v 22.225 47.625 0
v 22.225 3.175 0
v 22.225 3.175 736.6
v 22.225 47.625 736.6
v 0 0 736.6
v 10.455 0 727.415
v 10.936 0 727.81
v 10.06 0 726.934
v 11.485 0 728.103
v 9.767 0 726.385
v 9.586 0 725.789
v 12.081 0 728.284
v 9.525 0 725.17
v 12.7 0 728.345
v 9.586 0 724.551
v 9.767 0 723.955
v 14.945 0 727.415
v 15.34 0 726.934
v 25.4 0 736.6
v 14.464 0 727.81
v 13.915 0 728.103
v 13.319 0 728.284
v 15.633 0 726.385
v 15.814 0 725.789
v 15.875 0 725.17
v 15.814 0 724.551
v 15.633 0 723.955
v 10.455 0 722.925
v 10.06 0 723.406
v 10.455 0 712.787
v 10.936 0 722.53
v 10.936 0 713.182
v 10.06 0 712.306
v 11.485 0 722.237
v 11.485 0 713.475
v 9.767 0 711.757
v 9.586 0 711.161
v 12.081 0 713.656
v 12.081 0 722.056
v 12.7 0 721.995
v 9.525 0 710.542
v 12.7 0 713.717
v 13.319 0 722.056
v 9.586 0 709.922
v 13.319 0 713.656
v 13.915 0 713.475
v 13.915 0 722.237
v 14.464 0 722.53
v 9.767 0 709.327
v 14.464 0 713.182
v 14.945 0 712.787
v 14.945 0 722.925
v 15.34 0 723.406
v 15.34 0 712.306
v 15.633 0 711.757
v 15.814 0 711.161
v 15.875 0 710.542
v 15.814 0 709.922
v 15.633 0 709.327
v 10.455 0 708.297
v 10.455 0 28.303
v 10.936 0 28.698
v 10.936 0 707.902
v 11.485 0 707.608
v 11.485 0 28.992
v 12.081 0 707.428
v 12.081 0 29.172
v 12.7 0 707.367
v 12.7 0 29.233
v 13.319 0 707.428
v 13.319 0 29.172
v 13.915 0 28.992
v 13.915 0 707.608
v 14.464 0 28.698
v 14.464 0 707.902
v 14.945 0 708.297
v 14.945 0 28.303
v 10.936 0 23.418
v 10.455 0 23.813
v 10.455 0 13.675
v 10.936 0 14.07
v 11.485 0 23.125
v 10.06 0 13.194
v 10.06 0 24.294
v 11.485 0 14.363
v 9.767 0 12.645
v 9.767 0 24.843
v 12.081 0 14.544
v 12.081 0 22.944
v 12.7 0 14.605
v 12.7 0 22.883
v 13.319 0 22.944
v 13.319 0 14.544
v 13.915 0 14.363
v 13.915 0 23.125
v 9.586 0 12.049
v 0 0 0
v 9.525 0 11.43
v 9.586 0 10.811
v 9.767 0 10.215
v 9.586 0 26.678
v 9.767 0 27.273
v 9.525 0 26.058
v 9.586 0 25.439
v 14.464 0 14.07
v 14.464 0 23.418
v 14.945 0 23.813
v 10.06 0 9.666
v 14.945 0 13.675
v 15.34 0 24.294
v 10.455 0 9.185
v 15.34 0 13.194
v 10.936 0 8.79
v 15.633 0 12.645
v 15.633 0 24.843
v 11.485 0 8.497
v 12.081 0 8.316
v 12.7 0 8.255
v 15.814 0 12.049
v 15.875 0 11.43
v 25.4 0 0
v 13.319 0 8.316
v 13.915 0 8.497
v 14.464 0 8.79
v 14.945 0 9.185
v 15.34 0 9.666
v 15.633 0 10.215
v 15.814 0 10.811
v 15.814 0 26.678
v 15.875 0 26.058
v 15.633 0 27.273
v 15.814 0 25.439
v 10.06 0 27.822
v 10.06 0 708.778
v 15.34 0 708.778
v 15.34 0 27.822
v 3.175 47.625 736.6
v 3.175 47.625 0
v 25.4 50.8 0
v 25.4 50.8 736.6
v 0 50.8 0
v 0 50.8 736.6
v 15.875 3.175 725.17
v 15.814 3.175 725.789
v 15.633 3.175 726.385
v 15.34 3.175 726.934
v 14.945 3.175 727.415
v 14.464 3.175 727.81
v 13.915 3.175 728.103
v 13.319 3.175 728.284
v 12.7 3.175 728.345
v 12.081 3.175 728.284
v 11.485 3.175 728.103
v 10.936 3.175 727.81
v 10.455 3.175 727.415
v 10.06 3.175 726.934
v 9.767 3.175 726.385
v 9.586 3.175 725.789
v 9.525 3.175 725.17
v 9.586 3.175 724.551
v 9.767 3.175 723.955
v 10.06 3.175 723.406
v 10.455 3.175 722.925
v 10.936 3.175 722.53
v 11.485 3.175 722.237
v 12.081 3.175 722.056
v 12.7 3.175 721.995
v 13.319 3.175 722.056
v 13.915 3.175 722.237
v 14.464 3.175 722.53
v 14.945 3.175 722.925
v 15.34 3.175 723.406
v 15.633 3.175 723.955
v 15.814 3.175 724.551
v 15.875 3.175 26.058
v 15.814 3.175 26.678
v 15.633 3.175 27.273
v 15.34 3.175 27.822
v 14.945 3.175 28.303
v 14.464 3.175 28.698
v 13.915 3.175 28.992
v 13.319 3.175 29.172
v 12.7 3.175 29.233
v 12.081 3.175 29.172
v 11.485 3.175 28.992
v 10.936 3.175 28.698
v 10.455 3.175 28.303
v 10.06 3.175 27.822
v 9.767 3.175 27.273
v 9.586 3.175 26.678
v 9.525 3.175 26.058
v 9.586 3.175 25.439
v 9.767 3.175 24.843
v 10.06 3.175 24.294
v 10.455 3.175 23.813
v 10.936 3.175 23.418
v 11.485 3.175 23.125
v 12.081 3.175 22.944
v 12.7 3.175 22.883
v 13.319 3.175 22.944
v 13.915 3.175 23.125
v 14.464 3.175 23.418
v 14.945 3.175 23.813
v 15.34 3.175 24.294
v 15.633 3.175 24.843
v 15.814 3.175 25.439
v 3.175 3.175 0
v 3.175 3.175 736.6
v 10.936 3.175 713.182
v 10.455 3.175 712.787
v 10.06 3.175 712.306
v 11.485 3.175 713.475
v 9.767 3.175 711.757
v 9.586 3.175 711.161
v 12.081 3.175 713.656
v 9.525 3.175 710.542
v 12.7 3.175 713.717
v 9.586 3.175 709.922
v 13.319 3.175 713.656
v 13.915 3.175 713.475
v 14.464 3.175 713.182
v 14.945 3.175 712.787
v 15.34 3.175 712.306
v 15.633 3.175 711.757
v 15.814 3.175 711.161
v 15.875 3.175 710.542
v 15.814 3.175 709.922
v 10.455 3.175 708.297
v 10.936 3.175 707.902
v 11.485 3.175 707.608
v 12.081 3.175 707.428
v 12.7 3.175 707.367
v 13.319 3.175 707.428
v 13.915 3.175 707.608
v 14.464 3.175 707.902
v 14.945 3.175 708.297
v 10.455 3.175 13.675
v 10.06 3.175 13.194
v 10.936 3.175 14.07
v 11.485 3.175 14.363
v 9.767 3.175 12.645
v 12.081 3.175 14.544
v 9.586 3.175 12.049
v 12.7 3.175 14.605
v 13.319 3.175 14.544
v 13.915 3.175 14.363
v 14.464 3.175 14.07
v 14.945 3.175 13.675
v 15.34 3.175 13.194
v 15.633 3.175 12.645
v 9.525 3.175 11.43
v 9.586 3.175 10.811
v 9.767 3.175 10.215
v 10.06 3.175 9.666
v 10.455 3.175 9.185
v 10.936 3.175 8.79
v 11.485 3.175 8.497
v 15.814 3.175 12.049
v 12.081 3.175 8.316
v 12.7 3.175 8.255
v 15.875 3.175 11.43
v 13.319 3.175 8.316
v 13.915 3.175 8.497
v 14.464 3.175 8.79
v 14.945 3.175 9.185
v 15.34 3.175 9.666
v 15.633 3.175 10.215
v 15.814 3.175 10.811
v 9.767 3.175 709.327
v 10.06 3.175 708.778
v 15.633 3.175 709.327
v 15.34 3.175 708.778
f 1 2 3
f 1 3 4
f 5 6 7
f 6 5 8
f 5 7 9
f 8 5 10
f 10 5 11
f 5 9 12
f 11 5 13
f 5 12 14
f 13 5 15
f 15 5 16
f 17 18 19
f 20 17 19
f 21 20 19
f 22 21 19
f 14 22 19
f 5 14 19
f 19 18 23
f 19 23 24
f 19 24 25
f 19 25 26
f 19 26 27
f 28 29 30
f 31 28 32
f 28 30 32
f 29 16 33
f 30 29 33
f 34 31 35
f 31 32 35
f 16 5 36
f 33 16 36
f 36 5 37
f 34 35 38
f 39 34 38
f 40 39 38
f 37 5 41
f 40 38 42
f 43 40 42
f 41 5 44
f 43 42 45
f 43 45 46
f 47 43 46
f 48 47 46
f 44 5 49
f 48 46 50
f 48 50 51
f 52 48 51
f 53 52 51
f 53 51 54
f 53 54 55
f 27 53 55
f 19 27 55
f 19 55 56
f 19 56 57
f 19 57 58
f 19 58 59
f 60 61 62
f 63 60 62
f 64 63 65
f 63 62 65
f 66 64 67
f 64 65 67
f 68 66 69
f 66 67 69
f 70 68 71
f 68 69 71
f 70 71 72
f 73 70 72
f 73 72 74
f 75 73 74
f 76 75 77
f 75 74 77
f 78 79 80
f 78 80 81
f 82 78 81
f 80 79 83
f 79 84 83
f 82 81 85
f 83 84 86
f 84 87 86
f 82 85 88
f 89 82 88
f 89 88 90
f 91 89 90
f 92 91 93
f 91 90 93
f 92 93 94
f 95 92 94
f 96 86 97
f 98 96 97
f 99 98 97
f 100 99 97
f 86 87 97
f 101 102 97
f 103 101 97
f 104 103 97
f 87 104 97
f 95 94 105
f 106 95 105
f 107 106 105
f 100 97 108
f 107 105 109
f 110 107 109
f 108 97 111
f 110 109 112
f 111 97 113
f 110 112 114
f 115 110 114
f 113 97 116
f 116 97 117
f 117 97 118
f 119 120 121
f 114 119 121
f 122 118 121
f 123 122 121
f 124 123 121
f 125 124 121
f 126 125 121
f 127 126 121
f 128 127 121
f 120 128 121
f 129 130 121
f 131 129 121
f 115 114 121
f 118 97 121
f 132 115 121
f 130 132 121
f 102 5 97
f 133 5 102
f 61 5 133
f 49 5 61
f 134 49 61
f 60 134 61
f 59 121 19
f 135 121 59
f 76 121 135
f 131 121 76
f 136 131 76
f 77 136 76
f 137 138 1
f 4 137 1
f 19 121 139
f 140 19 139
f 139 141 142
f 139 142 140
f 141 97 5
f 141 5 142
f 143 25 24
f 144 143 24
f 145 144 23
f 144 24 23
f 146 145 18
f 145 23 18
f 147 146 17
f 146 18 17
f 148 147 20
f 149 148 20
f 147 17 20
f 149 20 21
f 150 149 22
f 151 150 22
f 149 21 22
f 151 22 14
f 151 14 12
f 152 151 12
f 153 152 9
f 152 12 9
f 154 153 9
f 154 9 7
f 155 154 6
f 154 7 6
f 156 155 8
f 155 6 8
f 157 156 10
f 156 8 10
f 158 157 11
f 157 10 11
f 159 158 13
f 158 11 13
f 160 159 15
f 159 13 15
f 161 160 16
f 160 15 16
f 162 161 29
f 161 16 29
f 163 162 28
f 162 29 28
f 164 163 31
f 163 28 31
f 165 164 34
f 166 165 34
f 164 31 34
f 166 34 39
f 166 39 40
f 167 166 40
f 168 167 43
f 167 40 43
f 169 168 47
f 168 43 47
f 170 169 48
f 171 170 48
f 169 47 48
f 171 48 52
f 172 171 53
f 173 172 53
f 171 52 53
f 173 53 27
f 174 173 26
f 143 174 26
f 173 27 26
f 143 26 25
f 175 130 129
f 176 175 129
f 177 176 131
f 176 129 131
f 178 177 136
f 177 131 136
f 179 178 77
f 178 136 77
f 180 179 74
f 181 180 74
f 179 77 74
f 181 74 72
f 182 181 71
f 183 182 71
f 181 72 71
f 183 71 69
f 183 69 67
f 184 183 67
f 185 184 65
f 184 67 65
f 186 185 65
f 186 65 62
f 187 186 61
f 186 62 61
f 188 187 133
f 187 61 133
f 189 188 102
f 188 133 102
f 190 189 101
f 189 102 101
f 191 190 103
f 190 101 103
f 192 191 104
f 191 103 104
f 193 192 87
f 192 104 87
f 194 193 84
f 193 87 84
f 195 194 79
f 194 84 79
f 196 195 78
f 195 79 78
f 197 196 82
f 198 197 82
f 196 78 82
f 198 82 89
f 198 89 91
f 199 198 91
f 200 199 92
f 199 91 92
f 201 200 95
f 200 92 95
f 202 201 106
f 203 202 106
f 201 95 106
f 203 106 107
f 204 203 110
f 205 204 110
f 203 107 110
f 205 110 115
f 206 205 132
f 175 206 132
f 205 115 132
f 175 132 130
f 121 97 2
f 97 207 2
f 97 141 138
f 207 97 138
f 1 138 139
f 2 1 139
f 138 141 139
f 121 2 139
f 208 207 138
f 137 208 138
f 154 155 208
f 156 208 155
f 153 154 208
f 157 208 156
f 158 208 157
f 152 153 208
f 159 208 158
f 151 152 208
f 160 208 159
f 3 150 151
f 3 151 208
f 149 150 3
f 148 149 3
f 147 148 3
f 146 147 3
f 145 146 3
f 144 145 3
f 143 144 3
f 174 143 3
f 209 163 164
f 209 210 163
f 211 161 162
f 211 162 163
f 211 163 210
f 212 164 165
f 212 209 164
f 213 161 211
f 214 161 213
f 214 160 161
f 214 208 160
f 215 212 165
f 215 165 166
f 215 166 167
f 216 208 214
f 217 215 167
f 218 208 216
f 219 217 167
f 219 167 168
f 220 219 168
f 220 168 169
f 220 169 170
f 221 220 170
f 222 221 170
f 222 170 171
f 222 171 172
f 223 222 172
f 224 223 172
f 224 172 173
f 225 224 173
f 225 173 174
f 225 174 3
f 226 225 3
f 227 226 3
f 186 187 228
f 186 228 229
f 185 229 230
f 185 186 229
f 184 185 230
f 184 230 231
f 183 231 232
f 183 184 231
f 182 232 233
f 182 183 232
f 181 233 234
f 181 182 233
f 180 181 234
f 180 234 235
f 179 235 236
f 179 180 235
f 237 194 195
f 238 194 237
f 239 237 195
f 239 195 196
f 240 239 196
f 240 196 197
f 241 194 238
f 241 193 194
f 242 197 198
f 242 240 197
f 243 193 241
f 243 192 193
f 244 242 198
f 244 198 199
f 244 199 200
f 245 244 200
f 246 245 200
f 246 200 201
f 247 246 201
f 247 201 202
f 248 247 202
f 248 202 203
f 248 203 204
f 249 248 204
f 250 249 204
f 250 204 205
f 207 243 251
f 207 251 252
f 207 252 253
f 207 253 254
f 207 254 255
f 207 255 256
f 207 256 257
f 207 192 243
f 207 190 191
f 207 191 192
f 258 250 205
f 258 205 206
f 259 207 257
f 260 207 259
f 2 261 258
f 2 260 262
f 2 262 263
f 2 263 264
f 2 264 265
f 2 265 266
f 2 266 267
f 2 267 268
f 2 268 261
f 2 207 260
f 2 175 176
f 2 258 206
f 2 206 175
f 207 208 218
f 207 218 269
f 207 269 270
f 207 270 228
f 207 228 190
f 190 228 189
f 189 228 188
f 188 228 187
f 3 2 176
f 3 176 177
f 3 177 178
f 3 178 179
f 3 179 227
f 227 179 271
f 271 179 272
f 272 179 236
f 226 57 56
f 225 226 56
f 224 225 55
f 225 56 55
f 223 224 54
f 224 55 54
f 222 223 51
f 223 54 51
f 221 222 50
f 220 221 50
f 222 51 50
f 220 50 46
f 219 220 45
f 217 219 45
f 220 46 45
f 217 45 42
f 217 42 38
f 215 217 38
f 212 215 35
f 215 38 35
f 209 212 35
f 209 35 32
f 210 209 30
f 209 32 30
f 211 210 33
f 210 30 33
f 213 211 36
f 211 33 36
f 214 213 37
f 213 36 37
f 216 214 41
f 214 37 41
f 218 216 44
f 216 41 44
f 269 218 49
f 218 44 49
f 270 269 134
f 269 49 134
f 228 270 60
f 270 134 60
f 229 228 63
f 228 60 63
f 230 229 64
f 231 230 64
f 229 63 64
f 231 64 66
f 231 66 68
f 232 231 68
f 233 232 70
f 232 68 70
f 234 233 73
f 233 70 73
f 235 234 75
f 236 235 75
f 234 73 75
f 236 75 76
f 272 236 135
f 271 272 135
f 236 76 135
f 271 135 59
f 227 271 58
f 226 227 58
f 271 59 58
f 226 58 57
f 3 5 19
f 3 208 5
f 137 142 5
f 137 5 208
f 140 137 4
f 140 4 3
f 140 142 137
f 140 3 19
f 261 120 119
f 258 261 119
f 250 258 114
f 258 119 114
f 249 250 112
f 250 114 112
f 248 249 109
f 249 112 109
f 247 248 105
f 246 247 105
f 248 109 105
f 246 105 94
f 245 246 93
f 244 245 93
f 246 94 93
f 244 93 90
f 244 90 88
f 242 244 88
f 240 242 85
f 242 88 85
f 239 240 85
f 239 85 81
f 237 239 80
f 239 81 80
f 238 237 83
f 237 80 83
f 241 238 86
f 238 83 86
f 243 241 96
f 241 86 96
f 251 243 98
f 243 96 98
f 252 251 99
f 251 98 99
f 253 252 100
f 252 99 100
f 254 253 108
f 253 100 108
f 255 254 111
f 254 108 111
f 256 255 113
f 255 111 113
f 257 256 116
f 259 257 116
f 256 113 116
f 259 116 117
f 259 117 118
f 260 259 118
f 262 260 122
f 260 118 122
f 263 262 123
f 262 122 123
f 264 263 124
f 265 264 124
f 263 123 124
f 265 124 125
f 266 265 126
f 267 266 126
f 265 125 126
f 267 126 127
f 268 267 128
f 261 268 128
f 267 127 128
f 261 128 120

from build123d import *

# Parameters (mm, degrees)
SKETCH1_W           = 25.4
SKETCH1_H           = 50.8
SKETCH1_W_2         = 19.05
SKETCH1_H_2         = 44.45
BOSS_EXTRUDE1_DEPTH = 736.6
SKETCH4_R           = 3.175
CUT_EXTRUDE1_DEPTH  = 3.175


with BuildPart() as part:
    # Sketch1 → Boss-Extrude1 (new body)
    with BuildSketch(Plane.XY):
        with Locations((12.7, 25.4)):
            Rectangle(SKETCH1_W, SKETCH1_H)
        with Locations((12.7, 25.4)):
            Rectangle(SKETCH1_W_2, SKETCH1_H_2, mode=Mode.SUBTRACT)
    extrude(amount=BOSS_EXTRUDE1_DEPTH)

    # Sketch4 → Cut-Extrude1 (cut)
    with BuildSketch(Plane.XZ):
        with Locations((12.7, 710.541764528)):
            Circle(SKETCH4_R)
        with Locations((12.7, 725.17)):
            Circle(SKETCH4_R)
        with Locations((12.7, 11.43)):
            Circle(SKETCH4_R)
        with Locations((12.7, 26.058235472)):
            Circle(SKETCH4_R)
    extrude(amount=-CUT_EXTRUDE1_DEPTH, mode=Mode.SUBTRACT)


solid = part.part
